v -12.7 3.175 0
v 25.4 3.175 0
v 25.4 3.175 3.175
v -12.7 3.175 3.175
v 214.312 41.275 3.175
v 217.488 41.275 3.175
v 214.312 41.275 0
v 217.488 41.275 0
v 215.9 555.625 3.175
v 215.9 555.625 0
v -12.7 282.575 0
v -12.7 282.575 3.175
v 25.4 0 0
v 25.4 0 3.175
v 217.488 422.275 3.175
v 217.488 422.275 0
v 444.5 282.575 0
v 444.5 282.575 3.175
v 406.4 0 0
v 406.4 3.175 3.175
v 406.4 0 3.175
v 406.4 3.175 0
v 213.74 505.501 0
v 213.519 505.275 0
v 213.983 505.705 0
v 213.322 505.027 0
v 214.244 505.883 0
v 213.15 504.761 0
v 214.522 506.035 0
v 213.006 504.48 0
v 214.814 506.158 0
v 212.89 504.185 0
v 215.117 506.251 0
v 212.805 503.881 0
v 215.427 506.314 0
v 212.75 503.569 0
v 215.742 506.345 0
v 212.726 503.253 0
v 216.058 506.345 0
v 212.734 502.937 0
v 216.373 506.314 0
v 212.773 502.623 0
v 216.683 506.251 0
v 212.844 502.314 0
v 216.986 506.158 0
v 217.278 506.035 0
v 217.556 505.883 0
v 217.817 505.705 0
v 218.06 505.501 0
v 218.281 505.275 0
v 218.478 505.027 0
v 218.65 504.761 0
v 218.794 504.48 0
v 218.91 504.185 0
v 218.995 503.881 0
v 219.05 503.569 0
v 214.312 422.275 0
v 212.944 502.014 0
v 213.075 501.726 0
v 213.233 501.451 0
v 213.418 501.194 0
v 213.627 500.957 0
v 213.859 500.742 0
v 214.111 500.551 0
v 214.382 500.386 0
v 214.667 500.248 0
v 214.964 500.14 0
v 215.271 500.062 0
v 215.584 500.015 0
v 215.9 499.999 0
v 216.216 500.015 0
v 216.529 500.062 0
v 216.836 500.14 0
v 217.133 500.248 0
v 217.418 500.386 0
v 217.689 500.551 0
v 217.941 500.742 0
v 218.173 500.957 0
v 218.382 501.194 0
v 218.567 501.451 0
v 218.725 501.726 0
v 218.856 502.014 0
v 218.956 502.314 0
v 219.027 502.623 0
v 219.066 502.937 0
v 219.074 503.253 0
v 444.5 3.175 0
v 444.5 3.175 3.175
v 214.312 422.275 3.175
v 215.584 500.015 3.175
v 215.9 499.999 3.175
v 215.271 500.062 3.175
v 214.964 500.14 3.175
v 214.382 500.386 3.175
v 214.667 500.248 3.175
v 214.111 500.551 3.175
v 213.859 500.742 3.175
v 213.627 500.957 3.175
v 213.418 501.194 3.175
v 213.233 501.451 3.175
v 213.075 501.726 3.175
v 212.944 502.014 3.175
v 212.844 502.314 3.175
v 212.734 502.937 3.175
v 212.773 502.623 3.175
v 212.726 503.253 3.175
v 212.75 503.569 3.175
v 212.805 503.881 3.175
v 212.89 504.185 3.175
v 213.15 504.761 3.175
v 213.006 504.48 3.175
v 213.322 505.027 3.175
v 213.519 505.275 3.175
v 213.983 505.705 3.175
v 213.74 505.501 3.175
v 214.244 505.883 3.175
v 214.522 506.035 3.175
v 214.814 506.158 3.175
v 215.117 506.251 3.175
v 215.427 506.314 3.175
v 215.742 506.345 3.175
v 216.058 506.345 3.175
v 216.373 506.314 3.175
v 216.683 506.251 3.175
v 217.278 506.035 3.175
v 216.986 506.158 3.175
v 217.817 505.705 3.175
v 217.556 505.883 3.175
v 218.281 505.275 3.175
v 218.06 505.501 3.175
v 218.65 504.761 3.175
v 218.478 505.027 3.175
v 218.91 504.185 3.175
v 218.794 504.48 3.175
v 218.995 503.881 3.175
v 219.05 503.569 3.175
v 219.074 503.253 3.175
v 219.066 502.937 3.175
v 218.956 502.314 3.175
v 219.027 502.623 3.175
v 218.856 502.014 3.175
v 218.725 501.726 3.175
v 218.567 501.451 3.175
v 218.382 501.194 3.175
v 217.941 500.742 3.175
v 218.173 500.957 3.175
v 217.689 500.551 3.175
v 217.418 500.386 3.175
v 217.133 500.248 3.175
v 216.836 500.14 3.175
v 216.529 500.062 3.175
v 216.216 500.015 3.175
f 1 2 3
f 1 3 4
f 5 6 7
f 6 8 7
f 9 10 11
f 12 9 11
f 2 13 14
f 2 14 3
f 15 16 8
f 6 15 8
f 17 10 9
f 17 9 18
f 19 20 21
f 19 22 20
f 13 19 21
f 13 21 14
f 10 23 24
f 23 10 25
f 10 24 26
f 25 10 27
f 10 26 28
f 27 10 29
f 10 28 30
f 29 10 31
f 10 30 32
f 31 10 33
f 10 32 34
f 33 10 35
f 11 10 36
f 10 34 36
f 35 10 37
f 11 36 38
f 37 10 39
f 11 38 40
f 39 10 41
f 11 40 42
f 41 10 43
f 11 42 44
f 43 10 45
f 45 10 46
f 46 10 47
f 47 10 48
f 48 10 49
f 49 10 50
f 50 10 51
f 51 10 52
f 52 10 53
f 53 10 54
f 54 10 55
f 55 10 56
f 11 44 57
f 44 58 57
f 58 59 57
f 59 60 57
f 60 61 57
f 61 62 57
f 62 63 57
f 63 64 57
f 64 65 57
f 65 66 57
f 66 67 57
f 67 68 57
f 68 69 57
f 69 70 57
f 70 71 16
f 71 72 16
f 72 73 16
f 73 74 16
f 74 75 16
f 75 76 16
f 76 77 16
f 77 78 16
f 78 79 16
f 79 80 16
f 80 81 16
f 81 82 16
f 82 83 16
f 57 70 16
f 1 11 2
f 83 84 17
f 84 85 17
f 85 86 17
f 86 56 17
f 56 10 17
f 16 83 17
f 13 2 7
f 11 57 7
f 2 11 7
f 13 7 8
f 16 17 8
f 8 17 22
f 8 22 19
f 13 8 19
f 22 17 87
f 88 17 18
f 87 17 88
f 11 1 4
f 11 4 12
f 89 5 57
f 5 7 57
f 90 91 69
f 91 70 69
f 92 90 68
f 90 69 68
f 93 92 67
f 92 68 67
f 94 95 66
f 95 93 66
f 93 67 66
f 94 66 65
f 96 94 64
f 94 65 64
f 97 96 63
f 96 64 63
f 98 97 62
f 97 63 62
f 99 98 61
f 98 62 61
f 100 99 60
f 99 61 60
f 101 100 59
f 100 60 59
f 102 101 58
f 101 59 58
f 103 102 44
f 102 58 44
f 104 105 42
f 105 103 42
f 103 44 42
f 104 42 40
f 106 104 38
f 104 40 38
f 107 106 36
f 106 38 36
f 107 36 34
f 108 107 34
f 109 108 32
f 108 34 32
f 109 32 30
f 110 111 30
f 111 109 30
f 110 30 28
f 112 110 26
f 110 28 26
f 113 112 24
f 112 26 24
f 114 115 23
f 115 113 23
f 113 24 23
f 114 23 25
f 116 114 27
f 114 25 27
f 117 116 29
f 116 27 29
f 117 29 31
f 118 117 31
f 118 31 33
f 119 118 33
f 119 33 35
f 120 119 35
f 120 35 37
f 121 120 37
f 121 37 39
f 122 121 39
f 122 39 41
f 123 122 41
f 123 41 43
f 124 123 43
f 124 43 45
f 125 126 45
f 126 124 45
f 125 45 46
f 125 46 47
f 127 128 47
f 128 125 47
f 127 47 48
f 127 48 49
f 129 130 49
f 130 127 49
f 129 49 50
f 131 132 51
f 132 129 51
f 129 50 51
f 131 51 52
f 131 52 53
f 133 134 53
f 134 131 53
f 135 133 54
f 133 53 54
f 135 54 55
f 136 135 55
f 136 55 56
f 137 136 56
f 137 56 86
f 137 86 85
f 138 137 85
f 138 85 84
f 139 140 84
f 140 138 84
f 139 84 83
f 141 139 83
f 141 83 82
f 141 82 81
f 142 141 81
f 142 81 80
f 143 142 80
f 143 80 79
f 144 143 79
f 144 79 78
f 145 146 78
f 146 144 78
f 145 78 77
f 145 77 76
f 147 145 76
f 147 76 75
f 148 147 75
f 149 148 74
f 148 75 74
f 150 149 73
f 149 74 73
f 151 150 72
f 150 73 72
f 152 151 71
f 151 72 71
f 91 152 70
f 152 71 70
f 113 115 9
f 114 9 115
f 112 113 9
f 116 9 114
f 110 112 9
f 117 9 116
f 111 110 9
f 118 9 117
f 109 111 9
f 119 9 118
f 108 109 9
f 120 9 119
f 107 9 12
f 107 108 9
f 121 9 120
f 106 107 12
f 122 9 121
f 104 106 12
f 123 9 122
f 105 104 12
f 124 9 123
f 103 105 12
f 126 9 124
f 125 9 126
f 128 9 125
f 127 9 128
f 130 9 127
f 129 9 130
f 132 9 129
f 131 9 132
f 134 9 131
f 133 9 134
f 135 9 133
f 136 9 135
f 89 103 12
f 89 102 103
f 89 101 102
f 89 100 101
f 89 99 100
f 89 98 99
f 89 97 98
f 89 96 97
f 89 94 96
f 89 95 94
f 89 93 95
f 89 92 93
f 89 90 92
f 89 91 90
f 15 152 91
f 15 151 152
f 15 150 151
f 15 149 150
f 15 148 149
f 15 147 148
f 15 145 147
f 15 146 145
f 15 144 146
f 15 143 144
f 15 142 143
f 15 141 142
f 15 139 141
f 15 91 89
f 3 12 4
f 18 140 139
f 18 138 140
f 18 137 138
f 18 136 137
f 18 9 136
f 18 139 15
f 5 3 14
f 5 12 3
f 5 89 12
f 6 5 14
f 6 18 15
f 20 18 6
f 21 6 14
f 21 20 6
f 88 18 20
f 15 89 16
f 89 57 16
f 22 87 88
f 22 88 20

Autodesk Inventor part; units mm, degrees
ref_plane "YZ Plane" through (0, 0, 0) normal (1, 0, 0) x (0, 1, 0)
ref_plane "XZ Plane" through (0, 0, 0) normal (0, 1, 0) x (-1, 0, 0)
ref_plane "XY Plane" through (0, 0, 0) normal (0, 0, 1) x (1, 0, 0)
sketch "Sketch1" plane through (0, 0, 0) normal (0, 0, 1) x (1, 0, 0)
  line L0 (0, 0) -> (-3.175, 0)
  line L1 (-3.175, 0) -> (-3.175, 381)
  line L2 (-3.175, 381) -> (0, 381)
  line L3 (0, 381) -> (0, 0)
  line L4 (-3.175, -38.1) -> (-555.625, -38.1)
  line L5 (-555.625, -38.1) -> (-555.625, 419.1)
  line L6 (-555.625, 419.1) -> (-3.175, 419.1)
  line L7 (-3.175, 419.1) -> (-3.175, -38.1)
  line L8 (-555.625, 190.5) -> (-282.575, -38.1)
  line L9 (-555.625, 190.5) -> (-282.575, 419.1)
  circle A0 centre (-503.174, 190.5) radius 3.175
  line L10 (-41.275, 188.9125) -> (-422.275, 188.9125)
  line L11 (-422.275, 188.9125) -> (-422.275, 192.0875)
  line L12 (-422.275, 192.0875) -> (-41.275, 192.0875)
  line L13 (-41.275, 192.0875) -> (-41.275, 188.9125)
  point P0 (-1.5875, 0)
  point P1 (-3.175, 0)
  point P2 (-3.175, 381)
  point P3 (-41.275, 190.5)
  dimension "d0" = 3.175
  dimension "d1" = 381
  dimension "d2" = 552.45
  dimension "d3" = 457.2
  dimension "d4" = 38.1
  dimension "d5" = 228.6
  dimension "d6" = 279.4
  dimension "d7" = 228.6
  dimension "d9" = 6.35
  dimension "d10" = 228.6
  dimension "d11" = 499.999
  dimension "d12" = 279.4
  dimension "d15" = 381
  dimension "d16" = 3.175
  dimension "d17" = 227.0125
  dimension "d18" = 38.1
extrude "Extrusion1" add sketch "Sketch1" along normal blind 3.175 contours L0 L1 L2 L3 | L7 L4 L8 L9 L6 L1
move or copy body "Move Body1" bodies to move or copy 1 copy no rotation origin (0, 0, 0) rotation axis (0, 0, 1) rotation angle -90
move or copy body "Move Body2" bodies to move or copy 1 copy no translate (25.4, 0, 0)
properties part number "side"
